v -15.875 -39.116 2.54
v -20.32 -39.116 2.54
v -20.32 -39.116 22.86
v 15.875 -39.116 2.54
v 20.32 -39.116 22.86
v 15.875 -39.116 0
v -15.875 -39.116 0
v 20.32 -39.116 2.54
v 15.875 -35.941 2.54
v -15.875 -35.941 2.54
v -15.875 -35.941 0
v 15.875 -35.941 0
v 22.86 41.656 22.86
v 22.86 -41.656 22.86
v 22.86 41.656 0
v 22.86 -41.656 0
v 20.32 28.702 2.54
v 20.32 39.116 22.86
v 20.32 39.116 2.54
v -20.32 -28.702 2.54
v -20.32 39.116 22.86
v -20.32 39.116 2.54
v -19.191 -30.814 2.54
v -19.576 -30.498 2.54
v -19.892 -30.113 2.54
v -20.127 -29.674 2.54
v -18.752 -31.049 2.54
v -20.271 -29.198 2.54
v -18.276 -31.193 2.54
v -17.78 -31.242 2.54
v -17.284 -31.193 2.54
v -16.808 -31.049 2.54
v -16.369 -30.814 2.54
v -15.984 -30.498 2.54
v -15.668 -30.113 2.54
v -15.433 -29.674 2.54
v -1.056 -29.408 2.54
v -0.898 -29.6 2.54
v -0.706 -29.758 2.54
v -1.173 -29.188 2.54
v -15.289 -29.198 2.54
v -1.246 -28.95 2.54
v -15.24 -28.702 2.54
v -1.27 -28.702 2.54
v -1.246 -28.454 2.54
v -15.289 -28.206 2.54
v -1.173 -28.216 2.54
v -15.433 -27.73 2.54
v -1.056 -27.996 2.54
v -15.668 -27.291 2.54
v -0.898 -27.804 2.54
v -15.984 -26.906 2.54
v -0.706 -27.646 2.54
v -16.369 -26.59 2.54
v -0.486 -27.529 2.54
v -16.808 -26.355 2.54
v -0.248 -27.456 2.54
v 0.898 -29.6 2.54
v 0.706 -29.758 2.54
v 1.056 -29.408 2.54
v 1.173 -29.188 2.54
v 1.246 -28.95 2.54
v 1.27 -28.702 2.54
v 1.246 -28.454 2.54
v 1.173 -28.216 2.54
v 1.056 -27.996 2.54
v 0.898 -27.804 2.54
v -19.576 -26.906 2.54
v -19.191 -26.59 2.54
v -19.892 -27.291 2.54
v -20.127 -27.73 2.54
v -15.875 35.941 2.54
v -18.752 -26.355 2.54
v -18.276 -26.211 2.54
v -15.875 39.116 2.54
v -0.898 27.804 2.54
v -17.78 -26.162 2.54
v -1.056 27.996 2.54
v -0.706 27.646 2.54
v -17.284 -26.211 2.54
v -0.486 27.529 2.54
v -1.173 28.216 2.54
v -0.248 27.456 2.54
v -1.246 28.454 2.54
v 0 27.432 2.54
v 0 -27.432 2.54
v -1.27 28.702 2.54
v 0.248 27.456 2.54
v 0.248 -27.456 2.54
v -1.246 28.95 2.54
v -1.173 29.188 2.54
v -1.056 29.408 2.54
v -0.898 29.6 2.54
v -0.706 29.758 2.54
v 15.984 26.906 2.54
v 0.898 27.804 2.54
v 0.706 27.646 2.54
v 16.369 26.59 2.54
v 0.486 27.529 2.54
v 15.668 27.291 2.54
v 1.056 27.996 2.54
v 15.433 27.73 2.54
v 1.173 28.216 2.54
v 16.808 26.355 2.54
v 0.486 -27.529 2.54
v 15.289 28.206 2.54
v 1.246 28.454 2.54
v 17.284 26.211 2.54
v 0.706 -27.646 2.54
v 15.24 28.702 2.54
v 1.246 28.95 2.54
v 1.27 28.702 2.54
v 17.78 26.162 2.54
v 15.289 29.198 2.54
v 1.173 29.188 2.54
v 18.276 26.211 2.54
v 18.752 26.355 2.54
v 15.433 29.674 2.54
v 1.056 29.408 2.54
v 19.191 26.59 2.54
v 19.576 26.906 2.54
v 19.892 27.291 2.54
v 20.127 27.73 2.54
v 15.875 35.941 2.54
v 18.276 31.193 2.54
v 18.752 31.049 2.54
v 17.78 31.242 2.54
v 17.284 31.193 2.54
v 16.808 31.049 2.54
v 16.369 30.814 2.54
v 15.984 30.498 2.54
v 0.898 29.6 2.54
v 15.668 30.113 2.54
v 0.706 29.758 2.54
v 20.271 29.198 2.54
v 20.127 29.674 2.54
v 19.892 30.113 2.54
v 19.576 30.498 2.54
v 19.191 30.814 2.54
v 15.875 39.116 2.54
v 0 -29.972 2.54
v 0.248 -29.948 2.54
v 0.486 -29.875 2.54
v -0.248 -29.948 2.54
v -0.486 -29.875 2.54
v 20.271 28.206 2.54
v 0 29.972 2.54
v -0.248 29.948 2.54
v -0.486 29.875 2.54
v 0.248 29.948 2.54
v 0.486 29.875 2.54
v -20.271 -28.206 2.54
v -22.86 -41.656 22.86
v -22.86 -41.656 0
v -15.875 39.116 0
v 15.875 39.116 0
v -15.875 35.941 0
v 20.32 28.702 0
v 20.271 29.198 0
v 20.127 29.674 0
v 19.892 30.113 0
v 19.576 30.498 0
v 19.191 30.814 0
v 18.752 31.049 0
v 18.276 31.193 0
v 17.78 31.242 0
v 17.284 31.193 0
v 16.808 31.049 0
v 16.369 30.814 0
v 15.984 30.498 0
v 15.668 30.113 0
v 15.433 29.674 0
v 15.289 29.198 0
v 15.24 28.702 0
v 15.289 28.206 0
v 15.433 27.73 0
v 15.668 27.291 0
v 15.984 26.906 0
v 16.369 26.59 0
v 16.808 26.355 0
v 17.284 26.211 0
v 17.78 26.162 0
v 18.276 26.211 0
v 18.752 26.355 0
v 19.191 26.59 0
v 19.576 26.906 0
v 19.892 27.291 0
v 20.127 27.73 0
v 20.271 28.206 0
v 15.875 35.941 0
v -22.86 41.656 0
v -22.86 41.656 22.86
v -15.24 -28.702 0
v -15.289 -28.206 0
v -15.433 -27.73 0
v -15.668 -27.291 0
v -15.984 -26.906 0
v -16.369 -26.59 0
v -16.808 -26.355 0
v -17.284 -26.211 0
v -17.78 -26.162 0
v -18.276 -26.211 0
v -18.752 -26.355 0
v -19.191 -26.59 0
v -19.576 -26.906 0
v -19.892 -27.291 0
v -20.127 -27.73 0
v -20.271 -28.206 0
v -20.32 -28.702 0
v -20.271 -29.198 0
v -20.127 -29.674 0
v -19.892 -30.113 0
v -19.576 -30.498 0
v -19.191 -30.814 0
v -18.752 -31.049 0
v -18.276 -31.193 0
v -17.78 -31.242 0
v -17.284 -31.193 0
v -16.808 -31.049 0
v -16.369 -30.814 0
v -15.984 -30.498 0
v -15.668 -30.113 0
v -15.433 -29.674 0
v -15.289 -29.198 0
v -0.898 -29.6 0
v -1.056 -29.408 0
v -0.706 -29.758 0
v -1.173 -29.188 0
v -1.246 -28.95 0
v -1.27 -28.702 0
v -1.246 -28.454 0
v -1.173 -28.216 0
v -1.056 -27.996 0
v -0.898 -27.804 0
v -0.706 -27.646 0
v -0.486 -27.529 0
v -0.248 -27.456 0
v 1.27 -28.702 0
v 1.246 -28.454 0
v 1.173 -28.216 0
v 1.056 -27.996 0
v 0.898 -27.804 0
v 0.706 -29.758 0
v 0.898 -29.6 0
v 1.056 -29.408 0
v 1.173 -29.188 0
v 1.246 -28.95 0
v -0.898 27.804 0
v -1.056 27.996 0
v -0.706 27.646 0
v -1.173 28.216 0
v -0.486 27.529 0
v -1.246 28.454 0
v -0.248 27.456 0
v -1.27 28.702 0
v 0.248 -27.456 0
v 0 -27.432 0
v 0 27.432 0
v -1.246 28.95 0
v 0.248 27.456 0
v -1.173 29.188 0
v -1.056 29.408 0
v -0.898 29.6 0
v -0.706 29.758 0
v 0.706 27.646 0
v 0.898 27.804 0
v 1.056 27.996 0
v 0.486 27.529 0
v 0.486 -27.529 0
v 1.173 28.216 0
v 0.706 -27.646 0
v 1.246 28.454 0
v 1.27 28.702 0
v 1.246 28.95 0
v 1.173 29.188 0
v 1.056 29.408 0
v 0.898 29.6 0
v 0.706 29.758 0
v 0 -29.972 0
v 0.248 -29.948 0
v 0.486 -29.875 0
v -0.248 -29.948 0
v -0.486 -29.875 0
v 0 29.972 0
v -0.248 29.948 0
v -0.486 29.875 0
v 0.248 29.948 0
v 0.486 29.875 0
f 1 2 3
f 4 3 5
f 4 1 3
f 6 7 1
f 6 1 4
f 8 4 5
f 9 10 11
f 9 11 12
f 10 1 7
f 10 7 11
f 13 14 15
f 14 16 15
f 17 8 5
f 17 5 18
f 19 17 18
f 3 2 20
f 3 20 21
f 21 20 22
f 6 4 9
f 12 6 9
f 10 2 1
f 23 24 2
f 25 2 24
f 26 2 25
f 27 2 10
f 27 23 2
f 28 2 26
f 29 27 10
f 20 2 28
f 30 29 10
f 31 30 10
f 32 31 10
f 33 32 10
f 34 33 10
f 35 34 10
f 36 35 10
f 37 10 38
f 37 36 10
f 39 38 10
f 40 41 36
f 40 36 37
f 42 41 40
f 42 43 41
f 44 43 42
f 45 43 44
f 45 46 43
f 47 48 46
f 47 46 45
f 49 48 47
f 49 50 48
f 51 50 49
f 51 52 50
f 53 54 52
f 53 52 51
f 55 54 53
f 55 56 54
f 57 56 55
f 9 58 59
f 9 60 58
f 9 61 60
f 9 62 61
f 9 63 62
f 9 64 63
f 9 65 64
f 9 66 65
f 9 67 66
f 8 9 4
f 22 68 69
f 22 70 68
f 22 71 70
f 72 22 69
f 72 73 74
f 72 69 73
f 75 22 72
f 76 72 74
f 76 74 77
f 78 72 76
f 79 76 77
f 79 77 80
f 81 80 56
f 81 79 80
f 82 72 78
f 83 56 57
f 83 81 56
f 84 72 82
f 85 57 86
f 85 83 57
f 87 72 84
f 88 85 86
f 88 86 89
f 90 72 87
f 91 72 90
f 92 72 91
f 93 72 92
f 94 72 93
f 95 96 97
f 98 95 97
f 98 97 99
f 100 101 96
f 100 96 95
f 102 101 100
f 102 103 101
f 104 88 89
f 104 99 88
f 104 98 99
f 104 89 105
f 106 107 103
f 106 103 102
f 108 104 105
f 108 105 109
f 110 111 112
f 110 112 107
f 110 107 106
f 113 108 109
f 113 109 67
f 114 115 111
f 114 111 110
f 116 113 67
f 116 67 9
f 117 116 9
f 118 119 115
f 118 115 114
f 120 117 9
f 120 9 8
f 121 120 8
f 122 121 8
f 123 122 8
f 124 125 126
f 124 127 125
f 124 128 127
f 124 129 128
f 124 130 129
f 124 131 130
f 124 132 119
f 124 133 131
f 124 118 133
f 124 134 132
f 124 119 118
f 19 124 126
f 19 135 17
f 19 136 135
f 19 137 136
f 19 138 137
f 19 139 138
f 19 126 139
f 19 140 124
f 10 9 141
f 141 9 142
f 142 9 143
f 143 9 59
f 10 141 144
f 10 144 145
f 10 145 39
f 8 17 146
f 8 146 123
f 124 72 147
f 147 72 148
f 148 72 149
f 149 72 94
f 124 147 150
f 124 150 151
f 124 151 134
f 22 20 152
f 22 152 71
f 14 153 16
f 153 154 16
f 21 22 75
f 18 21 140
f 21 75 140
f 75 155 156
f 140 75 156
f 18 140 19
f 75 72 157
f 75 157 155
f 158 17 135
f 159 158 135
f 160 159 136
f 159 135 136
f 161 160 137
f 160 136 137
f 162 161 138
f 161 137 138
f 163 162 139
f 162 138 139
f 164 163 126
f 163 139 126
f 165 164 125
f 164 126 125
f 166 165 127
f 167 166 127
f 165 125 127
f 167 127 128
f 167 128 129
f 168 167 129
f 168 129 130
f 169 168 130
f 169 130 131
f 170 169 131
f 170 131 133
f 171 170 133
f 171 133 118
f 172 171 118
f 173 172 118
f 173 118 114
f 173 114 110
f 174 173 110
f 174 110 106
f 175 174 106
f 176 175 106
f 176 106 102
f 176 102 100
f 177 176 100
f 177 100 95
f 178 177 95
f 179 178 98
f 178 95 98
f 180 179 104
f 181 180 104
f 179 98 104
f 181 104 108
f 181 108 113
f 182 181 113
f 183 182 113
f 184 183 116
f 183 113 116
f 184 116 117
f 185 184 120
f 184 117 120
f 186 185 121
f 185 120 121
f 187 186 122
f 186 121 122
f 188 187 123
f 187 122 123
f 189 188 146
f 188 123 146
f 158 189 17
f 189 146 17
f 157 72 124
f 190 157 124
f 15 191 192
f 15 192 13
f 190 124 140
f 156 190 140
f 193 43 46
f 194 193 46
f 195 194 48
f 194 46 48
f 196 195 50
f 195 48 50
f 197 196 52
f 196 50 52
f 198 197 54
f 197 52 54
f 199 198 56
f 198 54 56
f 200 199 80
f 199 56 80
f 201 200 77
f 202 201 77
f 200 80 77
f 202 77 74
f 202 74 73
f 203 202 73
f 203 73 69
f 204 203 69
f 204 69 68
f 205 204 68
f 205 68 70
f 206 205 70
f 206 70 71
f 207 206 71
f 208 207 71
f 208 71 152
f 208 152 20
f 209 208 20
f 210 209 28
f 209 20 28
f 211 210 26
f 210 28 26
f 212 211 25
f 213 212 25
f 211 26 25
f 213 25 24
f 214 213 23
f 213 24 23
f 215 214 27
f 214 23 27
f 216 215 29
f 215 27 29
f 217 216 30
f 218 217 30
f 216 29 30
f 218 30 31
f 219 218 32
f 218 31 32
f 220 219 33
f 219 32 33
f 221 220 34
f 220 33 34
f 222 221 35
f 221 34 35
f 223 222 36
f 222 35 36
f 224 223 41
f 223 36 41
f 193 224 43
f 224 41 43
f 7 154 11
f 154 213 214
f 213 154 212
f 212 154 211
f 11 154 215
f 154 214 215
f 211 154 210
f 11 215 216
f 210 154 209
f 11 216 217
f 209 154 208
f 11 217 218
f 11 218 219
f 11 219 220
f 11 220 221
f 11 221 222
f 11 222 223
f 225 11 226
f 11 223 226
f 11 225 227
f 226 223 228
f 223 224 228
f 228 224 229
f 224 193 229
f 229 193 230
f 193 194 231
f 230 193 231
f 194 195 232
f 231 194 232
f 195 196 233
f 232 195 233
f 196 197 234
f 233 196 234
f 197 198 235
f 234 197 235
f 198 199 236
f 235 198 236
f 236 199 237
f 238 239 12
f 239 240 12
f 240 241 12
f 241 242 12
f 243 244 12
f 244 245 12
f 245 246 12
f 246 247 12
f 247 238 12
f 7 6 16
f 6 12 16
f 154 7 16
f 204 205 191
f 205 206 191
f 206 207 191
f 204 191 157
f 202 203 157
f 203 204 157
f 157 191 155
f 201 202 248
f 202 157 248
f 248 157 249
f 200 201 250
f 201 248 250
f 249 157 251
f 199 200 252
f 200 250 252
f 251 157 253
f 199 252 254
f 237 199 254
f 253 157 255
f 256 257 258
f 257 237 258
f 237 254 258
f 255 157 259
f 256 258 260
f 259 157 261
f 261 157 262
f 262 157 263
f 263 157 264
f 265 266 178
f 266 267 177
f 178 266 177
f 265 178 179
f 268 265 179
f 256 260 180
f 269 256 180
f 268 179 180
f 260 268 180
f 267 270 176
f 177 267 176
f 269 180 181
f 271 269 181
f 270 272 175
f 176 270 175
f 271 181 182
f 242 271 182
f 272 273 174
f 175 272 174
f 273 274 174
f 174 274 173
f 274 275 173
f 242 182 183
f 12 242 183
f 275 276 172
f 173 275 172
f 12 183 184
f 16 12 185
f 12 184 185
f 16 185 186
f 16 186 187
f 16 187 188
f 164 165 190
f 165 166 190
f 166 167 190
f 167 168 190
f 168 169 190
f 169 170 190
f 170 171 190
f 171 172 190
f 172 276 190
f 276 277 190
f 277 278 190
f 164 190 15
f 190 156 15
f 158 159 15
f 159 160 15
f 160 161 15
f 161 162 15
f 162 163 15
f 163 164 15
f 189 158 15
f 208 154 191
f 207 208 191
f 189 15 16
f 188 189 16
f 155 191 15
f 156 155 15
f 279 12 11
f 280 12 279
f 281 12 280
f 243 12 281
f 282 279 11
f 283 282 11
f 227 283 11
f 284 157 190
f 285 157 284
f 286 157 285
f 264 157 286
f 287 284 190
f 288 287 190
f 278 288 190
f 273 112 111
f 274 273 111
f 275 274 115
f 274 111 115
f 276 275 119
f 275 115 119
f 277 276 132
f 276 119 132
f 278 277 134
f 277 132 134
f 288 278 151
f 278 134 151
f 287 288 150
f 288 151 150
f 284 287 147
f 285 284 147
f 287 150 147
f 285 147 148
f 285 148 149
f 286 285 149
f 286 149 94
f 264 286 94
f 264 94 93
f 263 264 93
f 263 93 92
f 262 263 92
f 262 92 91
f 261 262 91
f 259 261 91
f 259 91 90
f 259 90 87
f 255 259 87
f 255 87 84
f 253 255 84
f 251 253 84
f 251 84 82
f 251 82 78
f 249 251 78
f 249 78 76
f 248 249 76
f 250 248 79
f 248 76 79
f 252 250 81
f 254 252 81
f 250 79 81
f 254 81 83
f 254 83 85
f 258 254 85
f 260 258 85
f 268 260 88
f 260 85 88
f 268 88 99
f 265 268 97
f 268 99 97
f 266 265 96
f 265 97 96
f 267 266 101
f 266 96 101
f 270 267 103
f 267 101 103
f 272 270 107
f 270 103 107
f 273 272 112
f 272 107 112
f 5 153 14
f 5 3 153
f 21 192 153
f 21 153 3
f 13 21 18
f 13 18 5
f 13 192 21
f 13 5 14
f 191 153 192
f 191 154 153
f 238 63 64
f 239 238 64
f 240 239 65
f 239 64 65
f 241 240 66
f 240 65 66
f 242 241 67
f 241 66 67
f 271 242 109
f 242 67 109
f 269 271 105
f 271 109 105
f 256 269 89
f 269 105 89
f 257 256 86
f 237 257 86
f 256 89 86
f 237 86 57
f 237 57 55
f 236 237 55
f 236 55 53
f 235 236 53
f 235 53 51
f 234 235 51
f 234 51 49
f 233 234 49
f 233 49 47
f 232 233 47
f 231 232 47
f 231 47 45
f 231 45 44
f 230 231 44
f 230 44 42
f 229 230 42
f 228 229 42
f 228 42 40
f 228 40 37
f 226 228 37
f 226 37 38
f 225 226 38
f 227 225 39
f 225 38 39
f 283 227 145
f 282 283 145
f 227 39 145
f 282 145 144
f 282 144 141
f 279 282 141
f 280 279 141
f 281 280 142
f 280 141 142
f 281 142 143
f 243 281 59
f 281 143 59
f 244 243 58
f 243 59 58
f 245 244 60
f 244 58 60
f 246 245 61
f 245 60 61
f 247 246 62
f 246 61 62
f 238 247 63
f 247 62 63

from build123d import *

# Parameters (mm, degrees)
F0_W     = 45.72
F0_H     = 83.312
F1_DEPTH = 2.54
F2_W     = 45.72
F2_H     = 83.312
F2_W_2   = 40.64
F2_H_2   = 78.232
F3_DEPTH = 20.32
F4_R     = 1.27
F4_R_2   = 2.54
F4_W     = 31.75
F4_H     = 3.175
F5_DEPTH = 25.4


with BuildPart() as f1:
    # F0 (on Top) → F1 (new body)
    with BuildSketch(Plane.XY):
        Rectangle(F0_W, F0_H)
    extrude(amount=F1_DEPTH)

    # F2 (on face) → F3 (join)
    with BuildSketch(Plane.XY.offset(2.54)):
        Rectangle(F2_W, F2_H)
        Rectangle(F2_W_2, F2_H_2, mode=Mode.SUBTRACT)
    extrude(amount=F3_DEPTH)

    # F4 (on face) → F5 (cut)
    with BuildSketch(Plane.XY.offset(2.54)):
        with Locations((0, 28.702)):
            Circle(F4_R)
        with Locations((0, -28.702)):
            Circle(F4_R)
        with Locations((17.78, 28.702)):
            Circle(F4_R_2)
        with Locations((-17.78, -28.702)):
            Circle(F4_R_2)
        with Locations((0, 37.5285)):
            Rectangle(F4_W, F4_H)
        with Locations((0, -37.5285)):
            Rectangle(F4_W, F4_H)
    extrude(amount=-F5_DEPTH, mode=Mode.SUBTRACT)


solid = f1.part
